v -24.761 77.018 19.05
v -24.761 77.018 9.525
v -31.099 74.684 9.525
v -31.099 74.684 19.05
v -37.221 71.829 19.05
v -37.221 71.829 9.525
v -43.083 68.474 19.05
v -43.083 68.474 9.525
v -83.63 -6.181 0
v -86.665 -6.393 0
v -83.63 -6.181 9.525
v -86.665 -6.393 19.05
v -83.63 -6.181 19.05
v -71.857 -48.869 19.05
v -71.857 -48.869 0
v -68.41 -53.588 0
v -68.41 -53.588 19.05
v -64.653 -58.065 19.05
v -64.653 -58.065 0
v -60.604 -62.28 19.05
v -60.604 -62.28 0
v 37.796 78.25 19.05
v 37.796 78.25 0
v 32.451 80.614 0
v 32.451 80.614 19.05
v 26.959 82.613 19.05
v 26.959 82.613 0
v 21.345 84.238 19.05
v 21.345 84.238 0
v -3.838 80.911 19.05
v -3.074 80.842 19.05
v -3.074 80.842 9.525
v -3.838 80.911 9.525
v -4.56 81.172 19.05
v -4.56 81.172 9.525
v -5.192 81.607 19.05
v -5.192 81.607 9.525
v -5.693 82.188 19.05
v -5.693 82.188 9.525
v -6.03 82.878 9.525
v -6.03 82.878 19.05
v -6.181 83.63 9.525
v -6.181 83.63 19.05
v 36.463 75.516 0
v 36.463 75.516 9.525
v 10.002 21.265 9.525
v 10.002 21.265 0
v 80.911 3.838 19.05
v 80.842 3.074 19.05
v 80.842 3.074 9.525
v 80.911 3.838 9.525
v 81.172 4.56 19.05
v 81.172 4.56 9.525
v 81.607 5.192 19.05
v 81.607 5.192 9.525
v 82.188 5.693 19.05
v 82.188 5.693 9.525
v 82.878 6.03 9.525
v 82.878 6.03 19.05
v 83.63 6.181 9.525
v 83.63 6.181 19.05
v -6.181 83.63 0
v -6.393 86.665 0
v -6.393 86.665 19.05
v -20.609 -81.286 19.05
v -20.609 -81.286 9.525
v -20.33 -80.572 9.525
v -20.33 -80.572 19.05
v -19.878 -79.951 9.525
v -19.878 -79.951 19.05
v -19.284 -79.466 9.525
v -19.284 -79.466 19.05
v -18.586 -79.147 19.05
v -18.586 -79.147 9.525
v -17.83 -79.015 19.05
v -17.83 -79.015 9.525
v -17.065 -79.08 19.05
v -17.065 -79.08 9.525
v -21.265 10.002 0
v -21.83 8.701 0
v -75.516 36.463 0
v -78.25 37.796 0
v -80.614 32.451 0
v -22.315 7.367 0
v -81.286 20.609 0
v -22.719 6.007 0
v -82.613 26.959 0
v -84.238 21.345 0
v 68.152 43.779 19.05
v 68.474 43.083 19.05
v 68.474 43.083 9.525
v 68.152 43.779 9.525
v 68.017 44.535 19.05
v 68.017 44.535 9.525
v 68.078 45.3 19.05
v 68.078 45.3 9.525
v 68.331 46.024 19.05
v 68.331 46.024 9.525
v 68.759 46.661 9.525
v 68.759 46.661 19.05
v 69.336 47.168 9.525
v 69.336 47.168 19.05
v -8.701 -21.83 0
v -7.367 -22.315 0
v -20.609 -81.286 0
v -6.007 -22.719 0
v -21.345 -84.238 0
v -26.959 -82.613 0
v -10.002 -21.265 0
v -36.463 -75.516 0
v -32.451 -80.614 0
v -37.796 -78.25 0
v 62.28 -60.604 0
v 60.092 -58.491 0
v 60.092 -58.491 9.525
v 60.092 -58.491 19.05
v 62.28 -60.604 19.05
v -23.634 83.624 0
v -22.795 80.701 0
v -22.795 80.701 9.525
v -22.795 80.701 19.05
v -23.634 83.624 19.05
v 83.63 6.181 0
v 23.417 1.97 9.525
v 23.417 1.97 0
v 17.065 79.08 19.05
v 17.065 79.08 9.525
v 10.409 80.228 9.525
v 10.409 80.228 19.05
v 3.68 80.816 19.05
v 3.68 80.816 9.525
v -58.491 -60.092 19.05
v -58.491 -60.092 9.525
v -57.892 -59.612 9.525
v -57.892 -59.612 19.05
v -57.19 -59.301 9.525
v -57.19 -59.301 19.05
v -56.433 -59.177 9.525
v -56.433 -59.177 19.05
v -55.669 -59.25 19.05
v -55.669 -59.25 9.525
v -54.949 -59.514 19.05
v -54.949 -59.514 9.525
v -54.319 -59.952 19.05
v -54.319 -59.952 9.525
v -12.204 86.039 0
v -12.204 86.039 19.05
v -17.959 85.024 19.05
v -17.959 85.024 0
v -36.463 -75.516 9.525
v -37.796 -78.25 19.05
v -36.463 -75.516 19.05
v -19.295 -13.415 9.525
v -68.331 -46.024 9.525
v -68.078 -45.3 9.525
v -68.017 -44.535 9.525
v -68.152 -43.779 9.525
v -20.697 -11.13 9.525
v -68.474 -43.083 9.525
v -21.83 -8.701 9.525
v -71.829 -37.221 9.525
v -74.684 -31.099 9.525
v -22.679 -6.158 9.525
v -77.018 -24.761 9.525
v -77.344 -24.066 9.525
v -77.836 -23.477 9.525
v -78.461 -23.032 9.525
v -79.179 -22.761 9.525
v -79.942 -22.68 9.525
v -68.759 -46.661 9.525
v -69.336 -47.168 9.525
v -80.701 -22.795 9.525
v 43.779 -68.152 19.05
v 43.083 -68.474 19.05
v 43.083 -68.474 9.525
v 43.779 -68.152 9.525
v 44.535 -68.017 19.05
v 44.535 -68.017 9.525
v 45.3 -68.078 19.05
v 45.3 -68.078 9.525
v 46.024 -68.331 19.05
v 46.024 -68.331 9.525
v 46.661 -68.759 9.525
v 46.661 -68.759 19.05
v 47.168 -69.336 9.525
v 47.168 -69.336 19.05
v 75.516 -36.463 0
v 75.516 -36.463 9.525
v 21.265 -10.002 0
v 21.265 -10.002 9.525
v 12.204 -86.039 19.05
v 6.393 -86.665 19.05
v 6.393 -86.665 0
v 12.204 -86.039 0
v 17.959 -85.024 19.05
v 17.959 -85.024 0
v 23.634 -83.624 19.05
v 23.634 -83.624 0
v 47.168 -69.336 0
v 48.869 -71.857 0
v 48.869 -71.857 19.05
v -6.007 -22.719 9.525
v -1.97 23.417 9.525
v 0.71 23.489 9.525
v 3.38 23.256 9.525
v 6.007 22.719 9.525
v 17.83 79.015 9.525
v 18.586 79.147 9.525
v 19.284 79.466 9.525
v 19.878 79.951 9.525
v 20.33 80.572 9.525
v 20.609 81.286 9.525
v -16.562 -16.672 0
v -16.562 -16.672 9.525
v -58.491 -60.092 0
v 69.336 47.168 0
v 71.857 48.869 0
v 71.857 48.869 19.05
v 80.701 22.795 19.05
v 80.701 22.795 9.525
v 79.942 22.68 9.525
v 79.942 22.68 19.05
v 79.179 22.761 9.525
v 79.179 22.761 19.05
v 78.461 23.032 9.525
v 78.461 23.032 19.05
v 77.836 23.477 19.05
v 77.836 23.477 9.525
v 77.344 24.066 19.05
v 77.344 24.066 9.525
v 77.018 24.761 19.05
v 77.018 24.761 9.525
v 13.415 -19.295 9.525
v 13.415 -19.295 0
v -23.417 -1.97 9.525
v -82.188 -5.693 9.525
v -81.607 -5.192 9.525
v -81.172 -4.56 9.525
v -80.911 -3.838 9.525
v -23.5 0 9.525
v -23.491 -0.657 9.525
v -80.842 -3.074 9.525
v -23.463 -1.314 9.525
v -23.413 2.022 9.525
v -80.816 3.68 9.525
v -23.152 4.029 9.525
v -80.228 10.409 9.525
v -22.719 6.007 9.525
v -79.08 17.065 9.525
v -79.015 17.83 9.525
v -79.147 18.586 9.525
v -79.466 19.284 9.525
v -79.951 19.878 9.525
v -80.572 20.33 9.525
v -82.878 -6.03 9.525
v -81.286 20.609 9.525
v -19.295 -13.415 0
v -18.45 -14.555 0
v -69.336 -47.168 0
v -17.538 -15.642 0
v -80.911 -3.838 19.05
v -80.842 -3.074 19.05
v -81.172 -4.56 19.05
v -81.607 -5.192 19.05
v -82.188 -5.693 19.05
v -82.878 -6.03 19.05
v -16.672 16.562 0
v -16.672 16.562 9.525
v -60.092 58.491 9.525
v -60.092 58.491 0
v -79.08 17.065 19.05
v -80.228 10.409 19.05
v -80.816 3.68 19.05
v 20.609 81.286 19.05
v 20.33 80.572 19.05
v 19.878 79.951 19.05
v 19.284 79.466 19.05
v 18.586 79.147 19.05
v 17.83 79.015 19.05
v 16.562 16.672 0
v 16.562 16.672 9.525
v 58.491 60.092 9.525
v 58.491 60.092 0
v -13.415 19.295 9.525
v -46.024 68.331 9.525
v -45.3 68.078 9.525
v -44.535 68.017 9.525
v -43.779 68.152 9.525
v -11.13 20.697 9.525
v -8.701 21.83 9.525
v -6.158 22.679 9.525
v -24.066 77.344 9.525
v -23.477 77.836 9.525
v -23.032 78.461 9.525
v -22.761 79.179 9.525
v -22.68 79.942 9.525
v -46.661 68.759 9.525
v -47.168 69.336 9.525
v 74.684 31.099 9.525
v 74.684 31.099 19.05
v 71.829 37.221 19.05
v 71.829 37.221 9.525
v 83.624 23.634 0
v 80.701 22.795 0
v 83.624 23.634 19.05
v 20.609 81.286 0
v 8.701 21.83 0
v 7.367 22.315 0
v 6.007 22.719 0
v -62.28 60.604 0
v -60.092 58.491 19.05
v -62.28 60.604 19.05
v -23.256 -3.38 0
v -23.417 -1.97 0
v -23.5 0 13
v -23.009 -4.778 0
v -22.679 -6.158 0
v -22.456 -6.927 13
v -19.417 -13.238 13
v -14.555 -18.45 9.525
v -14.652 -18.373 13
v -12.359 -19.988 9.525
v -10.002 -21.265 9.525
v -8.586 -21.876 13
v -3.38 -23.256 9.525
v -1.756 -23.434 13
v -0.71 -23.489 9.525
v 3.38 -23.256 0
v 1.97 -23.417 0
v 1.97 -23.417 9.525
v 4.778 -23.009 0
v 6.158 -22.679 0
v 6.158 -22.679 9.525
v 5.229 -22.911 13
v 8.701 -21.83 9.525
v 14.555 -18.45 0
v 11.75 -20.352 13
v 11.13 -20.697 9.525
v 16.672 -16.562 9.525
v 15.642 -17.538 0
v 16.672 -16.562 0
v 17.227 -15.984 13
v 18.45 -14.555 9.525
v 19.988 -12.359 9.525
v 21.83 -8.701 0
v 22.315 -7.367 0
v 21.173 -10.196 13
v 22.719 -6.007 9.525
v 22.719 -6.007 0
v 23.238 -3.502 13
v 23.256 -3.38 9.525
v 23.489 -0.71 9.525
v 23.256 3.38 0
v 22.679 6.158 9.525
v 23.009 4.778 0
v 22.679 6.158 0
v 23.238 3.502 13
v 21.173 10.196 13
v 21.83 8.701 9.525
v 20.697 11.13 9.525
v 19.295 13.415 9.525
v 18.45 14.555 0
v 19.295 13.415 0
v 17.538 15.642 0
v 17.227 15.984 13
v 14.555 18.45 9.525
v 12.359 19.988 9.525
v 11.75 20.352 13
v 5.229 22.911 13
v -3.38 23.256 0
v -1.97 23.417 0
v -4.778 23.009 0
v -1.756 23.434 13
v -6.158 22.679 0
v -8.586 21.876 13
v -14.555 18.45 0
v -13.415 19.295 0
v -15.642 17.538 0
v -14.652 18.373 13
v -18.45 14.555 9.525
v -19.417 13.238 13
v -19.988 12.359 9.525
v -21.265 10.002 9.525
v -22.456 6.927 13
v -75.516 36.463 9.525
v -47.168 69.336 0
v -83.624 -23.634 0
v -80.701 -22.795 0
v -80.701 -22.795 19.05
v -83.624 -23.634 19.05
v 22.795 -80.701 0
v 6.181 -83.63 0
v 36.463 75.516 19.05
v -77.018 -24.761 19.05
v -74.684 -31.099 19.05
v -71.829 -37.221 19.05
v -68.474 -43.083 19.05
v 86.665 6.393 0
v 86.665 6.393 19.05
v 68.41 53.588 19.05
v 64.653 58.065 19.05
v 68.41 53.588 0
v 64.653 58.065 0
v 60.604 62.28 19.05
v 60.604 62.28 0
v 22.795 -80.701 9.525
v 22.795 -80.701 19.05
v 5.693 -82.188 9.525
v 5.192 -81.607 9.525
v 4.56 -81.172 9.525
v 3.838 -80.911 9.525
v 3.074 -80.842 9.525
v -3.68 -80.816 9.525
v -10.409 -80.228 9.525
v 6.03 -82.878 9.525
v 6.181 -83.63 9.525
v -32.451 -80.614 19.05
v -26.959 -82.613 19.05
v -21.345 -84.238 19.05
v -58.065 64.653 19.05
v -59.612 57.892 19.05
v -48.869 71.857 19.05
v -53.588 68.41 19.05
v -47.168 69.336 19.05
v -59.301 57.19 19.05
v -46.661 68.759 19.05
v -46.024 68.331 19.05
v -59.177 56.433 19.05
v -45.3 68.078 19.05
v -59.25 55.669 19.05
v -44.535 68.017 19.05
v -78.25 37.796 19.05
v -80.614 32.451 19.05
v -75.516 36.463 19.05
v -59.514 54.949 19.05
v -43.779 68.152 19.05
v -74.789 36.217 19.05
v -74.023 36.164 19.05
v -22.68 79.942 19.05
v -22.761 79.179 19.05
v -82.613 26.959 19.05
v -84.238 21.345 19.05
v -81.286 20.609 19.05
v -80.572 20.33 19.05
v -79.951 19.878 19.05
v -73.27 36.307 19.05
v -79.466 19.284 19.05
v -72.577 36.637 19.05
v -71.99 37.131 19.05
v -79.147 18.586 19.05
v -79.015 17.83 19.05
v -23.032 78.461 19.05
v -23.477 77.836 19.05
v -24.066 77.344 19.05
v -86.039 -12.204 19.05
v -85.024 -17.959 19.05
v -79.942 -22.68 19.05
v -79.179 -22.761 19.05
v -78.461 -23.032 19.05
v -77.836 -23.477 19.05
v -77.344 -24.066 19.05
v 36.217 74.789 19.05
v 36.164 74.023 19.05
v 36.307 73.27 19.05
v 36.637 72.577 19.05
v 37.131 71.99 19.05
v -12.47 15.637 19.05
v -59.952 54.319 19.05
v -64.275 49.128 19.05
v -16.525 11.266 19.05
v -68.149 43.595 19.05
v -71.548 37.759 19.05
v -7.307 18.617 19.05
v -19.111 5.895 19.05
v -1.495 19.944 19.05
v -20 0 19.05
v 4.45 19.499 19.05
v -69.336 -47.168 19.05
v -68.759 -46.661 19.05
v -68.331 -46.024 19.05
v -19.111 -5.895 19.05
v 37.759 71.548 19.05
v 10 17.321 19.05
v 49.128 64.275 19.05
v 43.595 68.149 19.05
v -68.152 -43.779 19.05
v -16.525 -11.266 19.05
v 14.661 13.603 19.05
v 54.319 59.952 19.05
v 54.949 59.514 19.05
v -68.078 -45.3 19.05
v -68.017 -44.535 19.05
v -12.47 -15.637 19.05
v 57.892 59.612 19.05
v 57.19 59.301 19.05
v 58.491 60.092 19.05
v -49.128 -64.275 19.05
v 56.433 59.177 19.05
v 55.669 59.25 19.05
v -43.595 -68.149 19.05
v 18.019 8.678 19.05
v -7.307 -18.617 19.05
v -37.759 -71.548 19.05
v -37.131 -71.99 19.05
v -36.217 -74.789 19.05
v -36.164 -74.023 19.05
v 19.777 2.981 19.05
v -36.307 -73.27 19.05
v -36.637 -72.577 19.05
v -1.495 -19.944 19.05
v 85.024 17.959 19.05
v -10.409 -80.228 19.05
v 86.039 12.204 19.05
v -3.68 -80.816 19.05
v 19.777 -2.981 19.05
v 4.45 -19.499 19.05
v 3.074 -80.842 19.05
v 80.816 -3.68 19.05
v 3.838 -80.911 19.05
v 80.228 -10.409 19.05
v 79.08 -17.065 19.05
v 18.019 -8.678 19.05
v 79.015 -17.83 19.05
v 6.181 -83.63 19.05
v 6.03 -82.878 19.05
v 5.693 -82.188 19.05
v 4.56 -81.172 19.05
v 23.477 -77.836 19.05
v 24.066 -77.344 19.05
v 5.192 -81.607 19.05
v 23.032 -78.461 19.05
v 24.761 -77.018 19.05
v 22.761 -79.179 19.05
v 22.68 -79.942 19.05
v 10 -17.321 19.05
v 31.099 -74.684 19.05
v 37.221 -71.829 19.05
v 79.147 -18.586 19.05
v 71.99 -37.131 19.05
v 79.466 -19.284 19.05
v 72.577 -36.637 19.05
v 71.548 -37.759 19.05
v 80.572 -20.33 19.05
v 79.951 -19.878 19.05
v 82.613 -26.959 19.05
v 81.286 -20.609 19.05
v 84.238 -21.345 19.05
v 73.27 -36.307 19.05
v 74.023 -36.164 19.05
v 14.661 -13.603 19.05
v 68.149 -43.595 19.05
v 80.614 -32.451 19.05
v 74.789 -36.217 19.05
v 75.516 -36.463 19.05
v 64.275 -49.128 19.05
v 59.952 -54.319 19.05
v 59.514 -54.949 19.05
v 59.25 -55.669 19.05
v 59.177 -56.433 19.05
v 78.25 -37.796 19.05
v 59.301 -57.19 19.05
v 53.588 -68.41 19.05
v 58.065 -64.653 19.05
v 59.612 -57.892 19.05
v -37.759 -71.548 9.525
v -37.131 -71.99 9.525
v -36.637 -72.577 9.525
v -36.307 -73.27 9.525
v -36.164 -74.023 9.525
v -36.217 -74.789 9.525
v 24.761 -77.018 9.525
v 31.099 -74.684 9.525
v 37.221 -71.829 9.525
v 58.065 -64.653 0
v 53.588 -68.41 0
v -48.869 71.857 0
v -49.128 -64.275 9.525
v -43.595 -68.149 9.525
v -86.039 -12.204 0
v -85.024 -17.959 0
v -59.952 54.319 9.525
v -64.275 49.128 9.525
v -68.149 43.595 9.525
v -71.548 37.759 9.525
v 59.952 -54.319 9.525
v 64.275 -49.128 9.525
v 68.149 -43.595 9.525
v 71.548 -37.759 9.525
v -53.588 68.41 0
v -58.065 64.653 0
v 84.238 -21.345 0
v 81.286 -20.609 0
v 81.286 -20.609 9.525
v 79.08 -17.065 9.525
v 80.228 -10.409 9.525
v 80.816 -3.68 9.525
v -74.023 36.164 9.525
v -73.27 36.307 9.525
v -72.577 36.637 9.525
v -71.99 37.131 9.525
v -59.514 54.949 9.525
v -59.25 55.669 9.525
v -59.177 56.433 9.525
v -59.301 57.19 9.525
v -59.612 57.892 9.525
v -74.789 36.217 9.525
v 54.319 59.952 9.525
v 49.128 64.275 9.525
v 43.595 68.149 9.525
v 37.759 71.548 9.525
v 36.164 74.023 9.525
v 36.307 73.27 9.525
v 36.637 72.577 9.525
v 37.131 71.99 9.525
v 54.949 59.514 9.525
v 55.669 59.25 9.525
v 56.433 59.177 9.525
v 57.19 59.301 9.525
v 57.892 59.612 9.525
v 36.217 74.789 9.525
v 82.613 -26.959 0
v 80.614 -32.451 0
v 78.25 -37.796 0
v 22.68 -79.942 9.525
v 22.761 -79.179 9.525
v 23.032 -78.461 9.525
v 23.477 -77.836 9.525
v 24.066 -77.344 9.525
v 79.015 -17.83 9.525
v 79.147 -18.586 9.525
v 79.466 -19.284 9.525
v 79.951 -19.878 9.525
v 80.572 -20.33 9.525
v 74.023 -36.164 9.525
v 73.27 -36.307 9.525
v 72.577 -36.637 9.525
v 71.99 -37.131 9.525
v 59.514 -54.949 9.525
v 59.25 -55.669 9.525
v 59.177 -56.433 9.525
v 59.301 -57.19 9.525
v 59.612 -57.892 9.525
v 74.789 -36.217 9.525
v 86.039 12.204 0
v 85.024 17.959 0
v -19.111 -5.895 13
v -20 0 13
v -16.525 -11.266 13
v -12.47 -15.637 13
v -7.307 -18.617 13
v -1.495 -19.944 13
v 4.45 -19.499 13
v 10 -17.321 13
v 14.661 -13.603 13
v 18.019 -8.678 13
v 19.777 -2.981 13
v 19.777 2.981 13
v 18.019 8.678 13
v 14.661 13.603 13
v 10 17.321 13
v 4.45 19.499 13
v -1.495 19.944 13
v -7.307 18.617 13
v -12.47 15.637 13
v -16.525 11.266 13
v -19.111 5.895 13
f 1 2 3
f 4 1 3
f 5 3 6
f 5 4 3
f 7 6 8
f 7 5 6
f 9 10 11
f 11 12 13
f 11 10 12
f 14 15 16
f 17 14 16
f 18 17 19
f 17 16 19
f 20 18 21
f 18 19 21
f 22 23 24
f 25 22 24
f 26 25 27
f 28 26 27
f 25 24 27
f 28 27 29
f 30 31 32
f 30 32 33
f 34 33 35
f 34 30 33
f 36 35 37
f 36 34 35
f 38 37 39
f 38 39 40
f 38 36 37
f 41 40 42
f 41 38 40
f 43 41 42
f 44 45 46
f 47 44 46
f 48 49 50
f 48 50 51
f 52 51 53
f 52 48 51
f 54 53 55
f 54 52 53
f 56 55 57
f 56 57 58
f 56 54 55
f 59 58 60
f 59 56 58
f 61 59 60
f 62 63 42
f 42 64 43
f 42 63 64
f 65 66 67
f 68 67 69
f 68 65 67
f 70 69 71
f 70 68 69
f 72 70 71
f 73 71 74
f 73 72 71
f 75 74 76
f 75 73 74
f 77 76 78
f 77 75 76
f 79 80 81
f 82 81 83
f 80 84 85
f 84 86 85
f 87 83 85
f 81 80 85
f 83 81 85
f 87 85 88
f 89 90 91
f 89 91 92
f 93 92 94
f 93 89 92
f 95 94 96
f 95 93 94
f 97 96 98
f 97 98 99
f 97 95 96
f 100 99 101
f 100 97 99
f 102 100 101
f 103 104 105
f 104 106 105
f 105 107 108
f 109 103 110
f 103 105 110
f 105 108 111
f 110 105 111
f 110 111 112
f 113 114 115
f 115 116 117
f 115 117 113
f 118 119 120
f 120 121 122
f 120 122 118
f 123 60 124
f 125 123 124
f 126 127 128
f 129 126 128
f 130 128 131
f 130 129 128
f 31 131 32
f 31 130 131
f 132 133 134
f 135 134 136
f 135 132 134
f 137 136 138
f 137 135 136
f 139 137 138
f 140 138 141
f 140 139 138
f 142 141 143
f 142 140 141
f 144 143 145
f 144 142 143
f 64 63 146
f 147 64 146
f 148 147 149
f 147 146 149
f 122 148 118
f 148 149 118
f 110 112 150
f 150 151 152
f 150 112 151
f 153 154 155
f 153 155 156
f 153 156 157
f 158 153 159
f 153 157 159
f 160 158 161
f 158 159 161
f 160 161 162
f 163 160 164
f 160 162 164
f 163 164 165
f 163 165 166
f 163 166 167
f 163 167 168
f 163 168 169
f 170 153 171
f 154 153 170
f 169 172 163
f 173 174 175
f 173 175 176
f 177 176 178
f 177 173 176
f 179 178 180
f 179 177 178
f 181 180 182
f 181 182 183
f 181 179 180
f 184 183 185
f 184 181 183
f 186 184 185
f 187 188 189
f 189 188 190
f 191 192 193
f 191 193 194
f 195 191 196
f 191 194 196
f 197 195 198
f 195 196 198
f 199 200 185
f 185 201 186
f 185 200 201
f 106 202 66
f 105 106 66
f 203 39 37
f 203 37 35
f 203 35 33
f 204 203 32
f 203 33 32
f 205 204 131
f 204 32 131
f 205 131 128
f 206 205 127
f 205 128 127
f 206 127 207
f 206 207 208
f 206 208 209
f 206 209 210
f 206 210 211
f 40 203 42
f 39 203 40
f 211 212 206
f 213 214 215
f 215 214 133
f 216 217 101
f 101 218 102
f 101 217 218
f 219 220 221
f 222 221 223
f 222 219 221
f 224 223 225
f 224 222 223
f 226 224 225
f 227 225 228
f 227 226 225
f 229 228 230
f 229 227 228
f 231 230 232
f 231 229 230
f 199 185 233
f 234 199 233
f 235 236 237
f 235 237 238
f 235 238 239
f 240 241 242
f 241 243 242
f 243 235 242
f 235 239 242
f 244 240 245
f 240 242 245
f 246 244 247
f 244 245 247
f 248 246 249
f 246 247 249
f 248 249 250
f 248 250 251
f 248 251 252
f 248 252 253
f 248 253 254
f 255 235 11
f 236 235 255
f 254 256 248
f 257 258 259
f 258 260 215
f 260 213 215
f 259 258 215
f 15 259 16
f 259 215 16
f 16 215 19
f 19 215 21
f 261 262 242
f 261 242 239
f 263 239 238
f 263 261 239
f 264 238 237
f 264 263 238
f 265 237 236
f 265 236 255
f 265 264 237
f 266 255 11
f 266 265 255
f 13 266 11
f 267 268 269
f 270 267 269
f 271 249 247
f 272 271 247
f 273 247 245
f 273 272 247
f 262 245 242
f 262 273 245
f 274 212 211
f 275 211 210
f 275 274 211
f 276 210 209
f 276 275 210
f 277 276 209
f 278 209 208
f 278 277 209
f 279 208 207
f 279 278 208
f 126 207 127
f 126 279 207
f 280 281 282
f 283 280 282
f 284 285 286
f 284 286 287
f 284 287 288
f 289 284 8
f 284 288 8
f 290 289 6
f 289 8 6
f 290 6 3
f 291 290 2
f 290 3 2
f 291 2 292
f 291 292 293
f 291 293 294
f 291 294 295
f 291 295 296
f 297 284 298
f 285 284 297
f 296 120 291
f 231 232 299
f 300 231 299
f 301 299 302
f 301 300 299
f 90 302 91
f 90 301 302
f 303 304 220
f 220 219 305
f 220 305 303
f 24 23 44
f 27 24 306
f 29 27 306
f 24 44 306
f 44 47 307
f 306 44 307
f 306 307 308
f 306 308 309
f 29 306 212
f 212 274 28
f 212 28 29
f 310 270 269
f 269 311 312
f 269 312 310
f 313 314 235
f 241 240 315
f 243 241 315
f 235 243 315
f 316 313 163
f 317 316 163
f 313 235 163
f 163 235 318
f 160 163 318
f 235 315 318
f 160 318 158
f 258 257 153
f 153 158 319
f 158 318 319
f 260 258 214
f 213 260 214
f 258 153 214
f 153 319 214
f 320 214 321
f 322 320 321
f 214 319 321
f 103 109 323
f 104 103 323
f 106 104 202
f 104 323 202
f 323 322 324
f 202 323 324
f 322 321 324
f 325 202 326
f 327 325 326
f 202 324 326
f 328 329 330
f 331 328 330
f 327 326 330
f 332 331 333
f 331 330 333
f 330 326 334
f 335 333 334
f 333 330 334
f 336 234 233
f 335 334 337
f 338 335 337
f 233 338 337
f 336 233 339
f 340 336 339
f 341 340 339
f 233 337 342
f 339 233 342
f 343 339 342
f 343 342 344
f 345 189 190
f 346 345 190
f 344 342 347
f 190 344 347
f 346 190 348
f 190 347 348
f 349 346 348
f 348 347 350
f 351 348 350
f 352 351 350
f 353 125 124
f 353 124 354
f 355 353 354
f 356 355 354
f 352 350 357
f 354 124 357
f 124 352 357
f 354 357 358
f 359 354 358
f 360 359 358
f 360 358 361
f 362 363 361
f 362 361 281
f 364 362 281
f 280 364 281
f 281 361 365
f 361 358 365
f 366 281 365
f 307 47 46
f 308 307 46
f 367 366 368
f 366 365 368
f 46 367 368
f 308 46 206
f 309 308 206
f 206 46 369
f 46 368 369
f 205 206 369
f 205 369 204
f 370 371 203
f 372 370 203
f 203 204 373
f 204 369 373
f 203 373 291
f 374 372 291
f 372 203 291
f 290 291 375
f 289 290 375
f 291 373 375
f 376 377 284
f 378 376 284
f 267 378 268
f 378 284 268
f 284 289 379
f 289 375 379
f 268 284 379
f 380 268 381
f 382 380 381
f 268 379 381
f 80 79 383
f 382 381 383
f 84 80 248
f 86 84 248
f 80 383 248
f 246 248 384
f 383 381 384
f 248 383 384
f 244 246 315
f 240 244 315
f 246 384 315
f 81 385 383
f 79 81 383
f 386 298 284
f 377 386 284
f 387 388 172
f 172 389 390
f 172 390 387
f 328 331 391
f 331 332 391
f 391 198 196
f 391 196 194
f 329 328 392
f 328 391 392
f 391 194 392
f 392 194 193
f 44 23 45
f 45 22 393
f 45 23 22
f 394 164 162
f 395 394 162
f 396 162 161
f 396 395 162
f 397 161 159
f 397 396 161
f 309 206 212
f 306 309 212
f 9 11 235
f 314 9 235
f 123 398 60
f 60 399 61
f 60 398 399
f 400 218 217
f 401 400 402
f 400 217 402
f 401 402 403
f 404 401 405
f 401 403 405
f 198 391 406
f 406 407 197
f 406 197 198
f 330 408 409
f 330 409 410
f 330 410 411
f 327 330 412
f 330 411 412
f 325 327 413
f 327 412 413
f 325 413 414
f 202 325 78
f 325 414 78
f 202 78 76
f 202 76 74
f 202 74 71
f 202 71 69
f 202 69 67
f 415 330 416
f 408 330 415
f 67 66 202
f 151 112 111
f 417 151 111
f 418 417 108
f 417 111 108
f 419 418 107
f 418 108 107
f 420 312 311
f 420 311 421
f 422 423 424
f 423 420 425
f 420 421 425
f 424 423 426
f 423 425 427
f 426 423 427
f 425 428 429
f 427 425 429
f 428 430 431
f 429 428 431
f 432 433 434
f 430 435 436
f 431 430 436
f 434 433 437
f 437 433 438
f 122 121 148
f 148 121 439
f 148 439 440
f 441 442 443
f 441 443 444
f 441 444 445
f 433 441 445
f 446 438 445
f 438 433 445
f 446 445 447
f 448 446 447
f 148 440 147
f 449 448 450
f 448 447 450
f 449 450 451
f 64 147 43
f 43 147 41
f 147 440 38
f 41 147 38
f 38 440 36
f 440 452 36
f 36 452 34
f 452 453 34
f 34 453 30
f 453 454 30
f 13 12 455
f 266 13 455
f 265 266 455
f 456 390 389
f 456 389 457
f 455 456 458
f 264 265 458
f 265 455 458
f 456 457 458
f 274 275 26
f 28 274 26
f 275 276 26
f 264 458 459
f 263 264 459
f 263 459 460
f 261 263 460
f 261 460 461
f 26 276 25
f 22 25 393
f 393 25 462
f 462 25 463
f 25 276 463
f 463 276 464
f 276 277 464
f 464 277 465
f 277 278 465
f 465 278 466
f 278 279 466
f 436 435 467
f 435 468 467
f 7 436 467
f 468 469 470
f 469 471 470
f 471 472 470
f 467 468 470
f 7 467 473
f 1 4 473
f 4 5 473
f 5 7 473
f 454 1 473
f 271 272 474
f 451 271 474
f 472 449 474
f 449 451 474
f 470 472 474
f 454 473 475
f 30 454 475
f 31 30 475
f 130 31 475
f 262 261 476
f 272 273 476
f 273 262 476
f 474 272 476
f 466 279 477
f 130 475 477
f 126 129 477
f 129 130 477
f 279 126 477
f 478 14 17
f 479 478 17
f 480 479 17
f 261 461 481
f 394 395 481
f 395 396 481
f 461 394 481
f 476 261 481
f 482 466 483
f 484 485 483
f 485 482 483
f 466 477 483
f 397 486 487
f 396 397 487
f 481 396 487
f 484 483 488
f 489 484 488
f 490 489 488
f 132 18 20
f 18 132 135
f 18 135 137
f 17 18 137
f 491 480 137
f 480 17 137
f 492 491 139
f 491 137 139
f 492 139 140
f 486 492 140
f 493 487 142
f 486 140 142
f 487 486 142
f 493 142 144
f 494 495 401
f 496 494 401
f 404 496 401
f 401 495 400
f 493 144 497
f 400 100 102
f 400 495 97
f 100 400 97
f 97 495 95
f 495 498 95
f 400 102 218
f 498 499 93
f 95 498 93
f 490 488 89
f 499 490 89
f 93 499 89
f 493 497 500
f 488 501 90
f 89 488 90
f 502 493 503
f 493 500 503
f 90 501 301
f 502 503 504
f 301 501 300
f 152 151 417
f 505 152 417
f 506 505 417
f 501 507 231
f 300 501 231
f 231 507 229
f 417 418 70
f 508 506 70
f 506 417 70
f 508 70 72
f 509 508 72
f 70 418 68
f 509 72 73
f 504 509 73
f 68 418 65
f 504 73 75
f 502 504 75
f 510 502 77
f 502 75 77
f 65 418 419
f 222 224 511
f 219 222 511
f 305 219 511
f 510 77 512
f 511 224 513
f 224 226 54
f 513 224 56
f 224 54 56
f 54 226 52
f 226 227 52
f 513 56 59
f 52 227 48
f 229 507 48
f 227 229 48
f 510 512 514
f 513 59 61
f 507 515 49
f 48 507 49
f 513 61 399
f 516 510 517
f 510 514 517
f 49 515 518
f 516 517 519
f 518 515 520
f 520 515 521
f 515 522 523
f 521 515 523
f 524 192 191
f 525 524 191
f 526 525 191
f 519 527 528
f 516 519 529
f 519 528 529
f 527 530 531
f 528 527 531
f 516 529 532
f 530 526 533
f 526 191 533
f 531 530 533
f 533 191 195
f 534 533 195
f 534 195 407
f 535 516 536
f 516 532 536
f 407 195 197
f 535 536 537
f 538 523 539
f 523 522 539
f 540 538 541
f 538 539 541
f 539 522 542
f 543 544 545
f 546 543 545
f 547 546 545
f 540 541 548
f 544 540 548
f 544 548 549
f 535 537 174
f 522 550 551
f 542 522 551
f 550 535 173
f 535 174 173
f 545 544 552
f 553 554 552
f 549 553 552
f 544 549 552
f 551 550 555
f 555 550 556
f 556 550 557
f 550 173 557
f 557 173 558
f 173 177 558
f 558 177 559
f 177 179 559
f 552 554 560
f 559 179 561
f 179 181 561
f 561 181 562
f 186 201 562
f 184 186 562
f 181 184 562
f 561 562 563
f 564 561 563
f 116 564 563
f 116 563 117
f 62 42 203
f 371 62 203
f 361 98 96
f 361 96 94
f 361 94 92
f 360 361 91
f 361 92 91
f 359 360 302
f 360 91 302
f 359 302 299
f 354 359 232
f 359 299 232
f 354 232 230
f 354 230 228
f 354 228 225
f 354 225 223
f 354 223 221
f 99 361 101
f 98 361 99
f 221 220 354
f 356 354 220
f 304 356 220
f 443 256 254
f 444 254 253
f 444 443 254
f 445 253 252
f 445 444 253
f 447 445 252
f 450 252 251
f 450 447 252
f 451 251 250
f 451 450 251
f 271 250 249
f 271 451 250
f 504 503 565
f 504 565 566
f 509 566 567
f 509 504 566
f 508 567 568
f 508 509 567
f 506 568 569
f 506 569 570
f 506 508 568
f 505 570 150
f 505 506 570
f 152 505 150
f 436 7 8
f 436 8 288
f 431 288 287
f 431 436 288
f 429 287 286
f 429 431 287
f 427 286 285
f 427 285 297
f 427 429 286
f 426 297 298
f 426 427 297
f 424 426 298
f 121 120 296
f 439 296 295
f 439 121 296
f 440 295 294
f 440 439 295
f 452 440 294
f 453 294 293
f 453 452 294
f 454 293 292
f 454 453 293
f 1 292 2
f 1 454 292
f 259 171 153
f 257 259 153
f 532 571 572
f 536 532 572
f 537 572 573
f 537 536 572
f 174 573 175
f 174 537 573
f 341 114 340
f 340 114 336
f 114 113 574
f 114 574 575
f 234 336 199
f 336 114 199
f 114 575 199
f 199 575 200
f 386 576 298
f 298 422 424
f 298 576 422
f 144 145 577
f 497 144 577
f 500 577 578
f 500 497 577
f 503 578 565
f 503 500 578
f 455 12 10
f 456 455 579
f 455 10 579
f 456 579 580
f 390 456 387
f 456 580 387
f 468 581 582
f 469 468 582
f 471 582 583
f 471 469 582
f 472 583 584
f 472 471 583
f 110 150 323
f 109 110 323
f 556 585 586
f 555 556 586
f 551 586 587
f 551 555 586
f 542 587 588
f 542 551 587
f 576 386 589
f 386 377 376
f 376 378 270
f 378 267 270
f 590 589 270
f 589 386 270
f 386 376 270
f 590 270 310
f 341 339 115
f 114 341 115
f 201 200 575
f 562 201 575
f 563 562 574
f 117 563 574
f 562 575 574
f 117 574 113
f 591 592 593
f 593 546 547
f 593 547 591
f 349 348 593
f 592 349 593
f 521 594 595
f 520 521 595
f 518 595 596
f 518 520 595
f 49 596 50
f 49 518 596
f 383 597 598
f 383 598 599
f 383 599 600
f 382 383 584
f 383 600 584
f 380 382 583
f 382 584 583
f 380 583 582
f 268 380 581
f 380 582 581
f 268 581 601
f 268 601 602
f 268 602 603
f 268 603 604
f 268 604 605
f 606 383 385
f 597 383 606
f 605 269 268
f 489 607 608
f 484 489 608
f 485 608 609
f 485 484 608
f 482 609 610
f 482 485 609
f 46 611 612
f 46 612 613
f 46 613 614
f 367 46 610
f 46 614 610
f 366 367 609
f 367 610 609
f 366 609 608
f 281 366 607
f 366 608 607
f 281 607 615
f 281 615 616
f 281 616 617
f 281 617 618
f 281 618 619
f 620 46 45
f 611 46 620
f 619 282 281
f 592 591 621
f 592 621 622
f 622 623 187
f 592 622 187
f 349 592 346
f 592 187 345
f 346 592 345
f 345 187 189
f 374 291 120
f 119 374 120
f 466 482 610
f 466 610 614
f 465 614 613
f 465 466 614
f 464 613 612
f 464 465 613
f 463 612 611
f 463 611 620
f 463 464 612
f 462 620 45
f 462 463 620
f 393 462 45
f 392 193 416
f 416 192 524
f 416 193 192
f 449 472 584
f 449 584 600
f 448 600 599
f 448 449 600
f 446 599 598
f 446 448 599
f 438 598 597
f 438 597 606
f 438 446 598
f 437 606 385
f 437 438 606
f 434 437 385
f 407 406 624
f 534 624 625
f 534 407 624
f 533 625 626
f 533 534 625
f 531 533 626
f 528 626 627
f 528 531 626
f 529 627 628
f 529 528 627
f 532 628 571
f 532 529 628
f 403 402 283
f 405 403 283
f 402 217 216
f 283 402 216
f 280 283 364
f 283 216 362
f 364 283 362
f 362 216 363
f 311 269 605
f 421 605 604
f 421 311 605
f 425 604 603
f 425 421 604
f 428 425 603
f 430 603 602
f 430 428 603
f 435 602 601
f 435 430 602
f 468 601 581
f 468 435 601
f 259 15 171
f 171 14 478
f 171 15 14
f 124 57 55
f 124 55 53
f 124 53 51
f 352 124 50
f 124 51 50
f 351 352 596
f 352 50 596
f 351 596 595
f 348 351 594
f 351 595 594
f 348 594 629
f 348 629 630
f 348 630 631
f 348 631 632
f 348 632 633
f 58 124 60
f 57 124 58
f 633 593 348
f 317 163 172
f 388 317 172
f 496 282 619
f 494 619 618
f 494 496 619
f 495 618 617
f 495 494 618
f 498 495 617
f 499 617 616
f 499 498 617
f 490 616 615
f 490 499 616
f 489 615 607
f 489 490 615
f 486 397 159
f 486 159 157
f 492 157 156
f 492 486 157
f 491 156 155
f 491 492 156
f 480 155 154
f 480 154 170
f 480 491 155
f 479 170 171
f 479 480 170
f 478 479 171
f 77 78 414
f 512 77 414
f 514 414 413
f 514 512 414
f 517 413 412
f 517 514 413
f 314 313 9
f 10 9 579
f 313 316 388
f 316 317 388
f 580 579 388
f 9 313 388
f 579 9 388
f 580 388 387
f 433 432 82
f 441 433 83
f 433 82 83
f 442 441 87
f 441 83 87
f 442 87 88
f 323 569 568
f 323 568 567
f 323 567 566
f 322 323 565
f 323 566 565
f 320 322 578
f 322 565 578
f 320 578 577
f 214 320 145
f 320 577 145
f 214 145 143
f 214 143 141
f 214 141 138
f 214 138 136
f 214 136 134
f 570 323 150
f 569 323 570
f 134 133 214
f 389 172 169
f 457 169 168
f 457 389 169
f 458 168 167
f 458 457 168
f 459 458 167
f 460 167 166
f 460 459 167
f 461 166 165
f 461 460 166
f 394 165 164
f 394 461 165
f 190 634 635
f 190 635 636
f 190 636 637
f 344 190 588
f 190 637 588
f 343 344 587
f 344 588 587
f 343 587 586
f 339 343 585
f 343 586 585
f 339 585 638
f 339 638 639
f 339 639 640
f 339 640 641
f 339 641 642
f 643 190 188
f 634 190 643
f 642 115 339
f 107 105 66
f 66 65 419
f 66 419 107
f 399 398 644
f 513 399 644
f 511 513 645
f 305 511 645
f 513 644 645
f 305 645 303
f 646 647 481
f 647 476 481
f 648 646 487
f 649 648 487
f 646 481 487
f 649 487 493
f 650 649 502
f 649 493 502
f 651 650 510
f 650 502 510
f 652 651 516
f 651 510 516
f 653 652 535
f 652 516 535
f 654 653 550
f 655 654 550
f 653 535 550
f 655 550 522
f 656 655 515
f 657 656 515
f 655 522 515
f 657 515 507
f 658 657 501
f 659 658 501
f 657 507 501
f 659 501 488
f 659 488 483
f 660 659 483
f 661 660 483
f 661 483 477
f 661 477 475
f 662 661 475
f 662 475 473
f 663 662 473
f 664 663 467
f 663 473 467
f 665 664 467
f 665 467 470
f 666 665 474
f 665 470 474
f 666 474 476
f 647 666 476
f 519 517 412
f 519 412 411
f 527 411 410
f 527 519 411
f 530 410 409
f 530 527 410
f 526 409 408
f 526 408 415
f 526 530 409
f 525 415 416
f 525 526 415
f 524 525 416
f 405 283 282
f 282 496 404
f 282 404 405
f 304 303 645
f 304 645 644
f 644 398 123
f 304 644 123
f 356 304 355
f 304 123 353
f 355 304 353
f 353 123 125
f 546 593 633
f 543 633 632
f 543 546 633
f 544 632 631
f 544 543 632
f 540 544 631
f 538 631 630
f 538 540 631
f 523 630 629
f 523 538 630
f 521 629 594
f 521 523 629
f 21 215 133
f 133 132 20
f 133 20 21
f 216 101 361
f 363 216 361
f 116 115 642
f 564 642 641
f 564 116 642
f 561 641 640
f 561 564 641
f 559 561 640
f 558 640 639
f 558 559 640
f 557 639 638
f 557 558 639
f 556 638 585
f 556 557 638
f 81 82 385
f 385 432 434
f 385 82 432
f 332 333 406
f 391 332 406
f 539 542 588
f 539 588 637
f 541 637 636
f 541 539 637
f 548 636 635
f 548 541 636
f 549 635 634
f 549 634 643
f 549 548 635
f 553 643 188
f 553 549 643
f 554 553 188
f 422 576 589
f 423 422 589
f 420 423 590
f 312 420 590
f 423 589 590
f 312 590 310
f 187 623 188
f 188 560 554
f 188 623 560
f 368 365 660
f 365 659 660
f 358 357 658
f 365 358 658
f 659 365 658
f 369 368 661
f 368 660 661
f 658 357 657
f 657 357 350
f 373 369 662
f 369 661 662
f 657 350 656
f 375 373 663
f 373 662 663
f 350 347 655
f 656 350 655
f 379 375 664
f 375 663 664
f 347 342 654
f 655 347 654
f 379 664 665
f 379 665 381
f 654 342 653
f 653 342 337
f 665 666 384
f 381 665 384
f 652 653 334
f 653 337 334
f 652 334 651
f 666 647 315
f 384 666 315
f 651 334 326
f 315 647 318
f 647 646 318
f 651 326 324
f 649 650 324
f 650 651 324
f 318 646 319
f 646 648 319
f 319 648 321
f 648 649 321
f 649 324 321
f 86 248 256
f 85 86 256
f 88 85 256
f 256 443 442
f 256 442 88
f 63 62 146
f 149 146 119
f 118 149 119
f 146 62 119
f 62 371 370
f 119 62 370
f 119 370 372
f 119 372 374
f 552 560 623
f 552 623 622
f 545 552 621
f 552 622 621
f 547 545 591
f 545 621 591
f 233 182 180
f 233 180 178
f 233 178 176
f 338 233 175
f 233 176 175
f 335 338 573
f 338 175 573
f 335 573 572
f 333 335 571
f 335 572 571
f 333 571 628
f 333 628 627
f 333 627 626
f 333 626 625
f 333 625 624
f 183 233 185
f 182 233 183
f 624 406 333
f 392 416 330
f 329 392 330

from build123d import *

# Parameters (mm, degrees)
CUT_EXTRUDE1_DEPTH = 125.362866242
CUT_EXTRUDE2_START = 9.525
CUT_EXTRUDE2_DEPTH = 9.525
CIRPATTERN2_COUNT  = 12


with BuildPart() as part:
    # Sketch4 → Revolve1 (revolve)
    with BuildSketch(Plane.YZ):
        Polygon((-20, 13), (-20, 19.05), (-86.9, 19.05), (-86.9, 0), (-23.5, 0), (-23.5, 13), align=None)
    revolve(axis=Axis((0, 0, 0), (0, 0, 1)))

    # Sketch1<4> → Cut-Extrude1 (cut, symmetric)
    with BuildSketch(Plane(origin=(0, 0, 0), x_dir=(0, 1, 0), z_dir=(0, 0, 1))):
        with BuildLine():
            Line((-48.868586739, 71.857297682), (-47.16763138, 69.335527658))
            ThreePointArc((-47.16763138, 69.335527658), (-45.299705883, 68.077700471), (-43.08288383, 68.47390102))
            ThreePointArc((-43.08288383, 68.47390102), (-34.189817375, 73.320299971), (-24.76090746, 77.017578914))
            ThreePointArc((-24.76090746, 77.017578914), (-23.032454577, 78.461090147), (-22.795326532, 80.700519613))
            Line((-22.795326532, 80.700519613), (-23.633761528, 83.62448993))
            ThreePointArc((-23.633761528, 83.62448993), (-36.725526945, 78.758146693), (-48.868586739, 71.857297682))
        make_face()
    cut_extrude1 = extrude(amount=CUT_EXTRUDE1_DEPTH, both=True, mode=Mode.SUBTRACT)

    # Sketch1 → Cut-Extrude2 (cut)
    with BuildSketch(Plane(origin=(0, 0, 0), x_dir=(0, 1, 0), z_dir=(0, 0, 1)).offset(CUT_EXTRUDE2_START)):
        with BuildLine():
            ThreePointArc((-43.08288383, 68.47390102), (-45.299705883, 68.077700471), (-47.16763138, 69.335527658))
            Line((-47.16763138, 69.335527658), (-10.3132812, 14.696706561))
            ThreePointArc((-10.3132812, 14.696706561), (-6.339273926, 13.594616806), (-4.629081023, 17.347292634))
            Line((-4.629081023, 17.347292634), (-22.795326532, 80.700519613))
            ThreePointArc((-22.795326532, 80.700519613), (-23.032454577, 78.461090147), (-24.76090746, 77.017578914))
            ThreePointArc((-24.76090746, 77.017578914), (-34.189817375, 73.320299971), (-43.08288383, 68.47390102))
        make_face()
    cut_extrude2 = extrude(amount=-CUT_EXTRUDE2_DEPTH, mode=Mode.SUBTRACT)

    # CirPattern2: Cut-Extrude1, Cut-Extrude2 ×12 about axis
    cirpattern2_axis = Axis((0, 0, 20.00502805), (0, 0, -1))
    add([cut_extrude1.rotate(cirpattern2_axis, i * 360 / CIRPATTERN2_COUNT) for i in range(1, CIRPATTERN2_COUNT)], mode=Mode.SUBTRACT)
    add([cut_extrude2.rotate(cirpattern2_axis, i * 360 / CIRPATTERN2_COUNT) for i in range(1, CIRPATTERN2_COUNT)], mode=Mode.SUBTRACT)


solid = part.part
